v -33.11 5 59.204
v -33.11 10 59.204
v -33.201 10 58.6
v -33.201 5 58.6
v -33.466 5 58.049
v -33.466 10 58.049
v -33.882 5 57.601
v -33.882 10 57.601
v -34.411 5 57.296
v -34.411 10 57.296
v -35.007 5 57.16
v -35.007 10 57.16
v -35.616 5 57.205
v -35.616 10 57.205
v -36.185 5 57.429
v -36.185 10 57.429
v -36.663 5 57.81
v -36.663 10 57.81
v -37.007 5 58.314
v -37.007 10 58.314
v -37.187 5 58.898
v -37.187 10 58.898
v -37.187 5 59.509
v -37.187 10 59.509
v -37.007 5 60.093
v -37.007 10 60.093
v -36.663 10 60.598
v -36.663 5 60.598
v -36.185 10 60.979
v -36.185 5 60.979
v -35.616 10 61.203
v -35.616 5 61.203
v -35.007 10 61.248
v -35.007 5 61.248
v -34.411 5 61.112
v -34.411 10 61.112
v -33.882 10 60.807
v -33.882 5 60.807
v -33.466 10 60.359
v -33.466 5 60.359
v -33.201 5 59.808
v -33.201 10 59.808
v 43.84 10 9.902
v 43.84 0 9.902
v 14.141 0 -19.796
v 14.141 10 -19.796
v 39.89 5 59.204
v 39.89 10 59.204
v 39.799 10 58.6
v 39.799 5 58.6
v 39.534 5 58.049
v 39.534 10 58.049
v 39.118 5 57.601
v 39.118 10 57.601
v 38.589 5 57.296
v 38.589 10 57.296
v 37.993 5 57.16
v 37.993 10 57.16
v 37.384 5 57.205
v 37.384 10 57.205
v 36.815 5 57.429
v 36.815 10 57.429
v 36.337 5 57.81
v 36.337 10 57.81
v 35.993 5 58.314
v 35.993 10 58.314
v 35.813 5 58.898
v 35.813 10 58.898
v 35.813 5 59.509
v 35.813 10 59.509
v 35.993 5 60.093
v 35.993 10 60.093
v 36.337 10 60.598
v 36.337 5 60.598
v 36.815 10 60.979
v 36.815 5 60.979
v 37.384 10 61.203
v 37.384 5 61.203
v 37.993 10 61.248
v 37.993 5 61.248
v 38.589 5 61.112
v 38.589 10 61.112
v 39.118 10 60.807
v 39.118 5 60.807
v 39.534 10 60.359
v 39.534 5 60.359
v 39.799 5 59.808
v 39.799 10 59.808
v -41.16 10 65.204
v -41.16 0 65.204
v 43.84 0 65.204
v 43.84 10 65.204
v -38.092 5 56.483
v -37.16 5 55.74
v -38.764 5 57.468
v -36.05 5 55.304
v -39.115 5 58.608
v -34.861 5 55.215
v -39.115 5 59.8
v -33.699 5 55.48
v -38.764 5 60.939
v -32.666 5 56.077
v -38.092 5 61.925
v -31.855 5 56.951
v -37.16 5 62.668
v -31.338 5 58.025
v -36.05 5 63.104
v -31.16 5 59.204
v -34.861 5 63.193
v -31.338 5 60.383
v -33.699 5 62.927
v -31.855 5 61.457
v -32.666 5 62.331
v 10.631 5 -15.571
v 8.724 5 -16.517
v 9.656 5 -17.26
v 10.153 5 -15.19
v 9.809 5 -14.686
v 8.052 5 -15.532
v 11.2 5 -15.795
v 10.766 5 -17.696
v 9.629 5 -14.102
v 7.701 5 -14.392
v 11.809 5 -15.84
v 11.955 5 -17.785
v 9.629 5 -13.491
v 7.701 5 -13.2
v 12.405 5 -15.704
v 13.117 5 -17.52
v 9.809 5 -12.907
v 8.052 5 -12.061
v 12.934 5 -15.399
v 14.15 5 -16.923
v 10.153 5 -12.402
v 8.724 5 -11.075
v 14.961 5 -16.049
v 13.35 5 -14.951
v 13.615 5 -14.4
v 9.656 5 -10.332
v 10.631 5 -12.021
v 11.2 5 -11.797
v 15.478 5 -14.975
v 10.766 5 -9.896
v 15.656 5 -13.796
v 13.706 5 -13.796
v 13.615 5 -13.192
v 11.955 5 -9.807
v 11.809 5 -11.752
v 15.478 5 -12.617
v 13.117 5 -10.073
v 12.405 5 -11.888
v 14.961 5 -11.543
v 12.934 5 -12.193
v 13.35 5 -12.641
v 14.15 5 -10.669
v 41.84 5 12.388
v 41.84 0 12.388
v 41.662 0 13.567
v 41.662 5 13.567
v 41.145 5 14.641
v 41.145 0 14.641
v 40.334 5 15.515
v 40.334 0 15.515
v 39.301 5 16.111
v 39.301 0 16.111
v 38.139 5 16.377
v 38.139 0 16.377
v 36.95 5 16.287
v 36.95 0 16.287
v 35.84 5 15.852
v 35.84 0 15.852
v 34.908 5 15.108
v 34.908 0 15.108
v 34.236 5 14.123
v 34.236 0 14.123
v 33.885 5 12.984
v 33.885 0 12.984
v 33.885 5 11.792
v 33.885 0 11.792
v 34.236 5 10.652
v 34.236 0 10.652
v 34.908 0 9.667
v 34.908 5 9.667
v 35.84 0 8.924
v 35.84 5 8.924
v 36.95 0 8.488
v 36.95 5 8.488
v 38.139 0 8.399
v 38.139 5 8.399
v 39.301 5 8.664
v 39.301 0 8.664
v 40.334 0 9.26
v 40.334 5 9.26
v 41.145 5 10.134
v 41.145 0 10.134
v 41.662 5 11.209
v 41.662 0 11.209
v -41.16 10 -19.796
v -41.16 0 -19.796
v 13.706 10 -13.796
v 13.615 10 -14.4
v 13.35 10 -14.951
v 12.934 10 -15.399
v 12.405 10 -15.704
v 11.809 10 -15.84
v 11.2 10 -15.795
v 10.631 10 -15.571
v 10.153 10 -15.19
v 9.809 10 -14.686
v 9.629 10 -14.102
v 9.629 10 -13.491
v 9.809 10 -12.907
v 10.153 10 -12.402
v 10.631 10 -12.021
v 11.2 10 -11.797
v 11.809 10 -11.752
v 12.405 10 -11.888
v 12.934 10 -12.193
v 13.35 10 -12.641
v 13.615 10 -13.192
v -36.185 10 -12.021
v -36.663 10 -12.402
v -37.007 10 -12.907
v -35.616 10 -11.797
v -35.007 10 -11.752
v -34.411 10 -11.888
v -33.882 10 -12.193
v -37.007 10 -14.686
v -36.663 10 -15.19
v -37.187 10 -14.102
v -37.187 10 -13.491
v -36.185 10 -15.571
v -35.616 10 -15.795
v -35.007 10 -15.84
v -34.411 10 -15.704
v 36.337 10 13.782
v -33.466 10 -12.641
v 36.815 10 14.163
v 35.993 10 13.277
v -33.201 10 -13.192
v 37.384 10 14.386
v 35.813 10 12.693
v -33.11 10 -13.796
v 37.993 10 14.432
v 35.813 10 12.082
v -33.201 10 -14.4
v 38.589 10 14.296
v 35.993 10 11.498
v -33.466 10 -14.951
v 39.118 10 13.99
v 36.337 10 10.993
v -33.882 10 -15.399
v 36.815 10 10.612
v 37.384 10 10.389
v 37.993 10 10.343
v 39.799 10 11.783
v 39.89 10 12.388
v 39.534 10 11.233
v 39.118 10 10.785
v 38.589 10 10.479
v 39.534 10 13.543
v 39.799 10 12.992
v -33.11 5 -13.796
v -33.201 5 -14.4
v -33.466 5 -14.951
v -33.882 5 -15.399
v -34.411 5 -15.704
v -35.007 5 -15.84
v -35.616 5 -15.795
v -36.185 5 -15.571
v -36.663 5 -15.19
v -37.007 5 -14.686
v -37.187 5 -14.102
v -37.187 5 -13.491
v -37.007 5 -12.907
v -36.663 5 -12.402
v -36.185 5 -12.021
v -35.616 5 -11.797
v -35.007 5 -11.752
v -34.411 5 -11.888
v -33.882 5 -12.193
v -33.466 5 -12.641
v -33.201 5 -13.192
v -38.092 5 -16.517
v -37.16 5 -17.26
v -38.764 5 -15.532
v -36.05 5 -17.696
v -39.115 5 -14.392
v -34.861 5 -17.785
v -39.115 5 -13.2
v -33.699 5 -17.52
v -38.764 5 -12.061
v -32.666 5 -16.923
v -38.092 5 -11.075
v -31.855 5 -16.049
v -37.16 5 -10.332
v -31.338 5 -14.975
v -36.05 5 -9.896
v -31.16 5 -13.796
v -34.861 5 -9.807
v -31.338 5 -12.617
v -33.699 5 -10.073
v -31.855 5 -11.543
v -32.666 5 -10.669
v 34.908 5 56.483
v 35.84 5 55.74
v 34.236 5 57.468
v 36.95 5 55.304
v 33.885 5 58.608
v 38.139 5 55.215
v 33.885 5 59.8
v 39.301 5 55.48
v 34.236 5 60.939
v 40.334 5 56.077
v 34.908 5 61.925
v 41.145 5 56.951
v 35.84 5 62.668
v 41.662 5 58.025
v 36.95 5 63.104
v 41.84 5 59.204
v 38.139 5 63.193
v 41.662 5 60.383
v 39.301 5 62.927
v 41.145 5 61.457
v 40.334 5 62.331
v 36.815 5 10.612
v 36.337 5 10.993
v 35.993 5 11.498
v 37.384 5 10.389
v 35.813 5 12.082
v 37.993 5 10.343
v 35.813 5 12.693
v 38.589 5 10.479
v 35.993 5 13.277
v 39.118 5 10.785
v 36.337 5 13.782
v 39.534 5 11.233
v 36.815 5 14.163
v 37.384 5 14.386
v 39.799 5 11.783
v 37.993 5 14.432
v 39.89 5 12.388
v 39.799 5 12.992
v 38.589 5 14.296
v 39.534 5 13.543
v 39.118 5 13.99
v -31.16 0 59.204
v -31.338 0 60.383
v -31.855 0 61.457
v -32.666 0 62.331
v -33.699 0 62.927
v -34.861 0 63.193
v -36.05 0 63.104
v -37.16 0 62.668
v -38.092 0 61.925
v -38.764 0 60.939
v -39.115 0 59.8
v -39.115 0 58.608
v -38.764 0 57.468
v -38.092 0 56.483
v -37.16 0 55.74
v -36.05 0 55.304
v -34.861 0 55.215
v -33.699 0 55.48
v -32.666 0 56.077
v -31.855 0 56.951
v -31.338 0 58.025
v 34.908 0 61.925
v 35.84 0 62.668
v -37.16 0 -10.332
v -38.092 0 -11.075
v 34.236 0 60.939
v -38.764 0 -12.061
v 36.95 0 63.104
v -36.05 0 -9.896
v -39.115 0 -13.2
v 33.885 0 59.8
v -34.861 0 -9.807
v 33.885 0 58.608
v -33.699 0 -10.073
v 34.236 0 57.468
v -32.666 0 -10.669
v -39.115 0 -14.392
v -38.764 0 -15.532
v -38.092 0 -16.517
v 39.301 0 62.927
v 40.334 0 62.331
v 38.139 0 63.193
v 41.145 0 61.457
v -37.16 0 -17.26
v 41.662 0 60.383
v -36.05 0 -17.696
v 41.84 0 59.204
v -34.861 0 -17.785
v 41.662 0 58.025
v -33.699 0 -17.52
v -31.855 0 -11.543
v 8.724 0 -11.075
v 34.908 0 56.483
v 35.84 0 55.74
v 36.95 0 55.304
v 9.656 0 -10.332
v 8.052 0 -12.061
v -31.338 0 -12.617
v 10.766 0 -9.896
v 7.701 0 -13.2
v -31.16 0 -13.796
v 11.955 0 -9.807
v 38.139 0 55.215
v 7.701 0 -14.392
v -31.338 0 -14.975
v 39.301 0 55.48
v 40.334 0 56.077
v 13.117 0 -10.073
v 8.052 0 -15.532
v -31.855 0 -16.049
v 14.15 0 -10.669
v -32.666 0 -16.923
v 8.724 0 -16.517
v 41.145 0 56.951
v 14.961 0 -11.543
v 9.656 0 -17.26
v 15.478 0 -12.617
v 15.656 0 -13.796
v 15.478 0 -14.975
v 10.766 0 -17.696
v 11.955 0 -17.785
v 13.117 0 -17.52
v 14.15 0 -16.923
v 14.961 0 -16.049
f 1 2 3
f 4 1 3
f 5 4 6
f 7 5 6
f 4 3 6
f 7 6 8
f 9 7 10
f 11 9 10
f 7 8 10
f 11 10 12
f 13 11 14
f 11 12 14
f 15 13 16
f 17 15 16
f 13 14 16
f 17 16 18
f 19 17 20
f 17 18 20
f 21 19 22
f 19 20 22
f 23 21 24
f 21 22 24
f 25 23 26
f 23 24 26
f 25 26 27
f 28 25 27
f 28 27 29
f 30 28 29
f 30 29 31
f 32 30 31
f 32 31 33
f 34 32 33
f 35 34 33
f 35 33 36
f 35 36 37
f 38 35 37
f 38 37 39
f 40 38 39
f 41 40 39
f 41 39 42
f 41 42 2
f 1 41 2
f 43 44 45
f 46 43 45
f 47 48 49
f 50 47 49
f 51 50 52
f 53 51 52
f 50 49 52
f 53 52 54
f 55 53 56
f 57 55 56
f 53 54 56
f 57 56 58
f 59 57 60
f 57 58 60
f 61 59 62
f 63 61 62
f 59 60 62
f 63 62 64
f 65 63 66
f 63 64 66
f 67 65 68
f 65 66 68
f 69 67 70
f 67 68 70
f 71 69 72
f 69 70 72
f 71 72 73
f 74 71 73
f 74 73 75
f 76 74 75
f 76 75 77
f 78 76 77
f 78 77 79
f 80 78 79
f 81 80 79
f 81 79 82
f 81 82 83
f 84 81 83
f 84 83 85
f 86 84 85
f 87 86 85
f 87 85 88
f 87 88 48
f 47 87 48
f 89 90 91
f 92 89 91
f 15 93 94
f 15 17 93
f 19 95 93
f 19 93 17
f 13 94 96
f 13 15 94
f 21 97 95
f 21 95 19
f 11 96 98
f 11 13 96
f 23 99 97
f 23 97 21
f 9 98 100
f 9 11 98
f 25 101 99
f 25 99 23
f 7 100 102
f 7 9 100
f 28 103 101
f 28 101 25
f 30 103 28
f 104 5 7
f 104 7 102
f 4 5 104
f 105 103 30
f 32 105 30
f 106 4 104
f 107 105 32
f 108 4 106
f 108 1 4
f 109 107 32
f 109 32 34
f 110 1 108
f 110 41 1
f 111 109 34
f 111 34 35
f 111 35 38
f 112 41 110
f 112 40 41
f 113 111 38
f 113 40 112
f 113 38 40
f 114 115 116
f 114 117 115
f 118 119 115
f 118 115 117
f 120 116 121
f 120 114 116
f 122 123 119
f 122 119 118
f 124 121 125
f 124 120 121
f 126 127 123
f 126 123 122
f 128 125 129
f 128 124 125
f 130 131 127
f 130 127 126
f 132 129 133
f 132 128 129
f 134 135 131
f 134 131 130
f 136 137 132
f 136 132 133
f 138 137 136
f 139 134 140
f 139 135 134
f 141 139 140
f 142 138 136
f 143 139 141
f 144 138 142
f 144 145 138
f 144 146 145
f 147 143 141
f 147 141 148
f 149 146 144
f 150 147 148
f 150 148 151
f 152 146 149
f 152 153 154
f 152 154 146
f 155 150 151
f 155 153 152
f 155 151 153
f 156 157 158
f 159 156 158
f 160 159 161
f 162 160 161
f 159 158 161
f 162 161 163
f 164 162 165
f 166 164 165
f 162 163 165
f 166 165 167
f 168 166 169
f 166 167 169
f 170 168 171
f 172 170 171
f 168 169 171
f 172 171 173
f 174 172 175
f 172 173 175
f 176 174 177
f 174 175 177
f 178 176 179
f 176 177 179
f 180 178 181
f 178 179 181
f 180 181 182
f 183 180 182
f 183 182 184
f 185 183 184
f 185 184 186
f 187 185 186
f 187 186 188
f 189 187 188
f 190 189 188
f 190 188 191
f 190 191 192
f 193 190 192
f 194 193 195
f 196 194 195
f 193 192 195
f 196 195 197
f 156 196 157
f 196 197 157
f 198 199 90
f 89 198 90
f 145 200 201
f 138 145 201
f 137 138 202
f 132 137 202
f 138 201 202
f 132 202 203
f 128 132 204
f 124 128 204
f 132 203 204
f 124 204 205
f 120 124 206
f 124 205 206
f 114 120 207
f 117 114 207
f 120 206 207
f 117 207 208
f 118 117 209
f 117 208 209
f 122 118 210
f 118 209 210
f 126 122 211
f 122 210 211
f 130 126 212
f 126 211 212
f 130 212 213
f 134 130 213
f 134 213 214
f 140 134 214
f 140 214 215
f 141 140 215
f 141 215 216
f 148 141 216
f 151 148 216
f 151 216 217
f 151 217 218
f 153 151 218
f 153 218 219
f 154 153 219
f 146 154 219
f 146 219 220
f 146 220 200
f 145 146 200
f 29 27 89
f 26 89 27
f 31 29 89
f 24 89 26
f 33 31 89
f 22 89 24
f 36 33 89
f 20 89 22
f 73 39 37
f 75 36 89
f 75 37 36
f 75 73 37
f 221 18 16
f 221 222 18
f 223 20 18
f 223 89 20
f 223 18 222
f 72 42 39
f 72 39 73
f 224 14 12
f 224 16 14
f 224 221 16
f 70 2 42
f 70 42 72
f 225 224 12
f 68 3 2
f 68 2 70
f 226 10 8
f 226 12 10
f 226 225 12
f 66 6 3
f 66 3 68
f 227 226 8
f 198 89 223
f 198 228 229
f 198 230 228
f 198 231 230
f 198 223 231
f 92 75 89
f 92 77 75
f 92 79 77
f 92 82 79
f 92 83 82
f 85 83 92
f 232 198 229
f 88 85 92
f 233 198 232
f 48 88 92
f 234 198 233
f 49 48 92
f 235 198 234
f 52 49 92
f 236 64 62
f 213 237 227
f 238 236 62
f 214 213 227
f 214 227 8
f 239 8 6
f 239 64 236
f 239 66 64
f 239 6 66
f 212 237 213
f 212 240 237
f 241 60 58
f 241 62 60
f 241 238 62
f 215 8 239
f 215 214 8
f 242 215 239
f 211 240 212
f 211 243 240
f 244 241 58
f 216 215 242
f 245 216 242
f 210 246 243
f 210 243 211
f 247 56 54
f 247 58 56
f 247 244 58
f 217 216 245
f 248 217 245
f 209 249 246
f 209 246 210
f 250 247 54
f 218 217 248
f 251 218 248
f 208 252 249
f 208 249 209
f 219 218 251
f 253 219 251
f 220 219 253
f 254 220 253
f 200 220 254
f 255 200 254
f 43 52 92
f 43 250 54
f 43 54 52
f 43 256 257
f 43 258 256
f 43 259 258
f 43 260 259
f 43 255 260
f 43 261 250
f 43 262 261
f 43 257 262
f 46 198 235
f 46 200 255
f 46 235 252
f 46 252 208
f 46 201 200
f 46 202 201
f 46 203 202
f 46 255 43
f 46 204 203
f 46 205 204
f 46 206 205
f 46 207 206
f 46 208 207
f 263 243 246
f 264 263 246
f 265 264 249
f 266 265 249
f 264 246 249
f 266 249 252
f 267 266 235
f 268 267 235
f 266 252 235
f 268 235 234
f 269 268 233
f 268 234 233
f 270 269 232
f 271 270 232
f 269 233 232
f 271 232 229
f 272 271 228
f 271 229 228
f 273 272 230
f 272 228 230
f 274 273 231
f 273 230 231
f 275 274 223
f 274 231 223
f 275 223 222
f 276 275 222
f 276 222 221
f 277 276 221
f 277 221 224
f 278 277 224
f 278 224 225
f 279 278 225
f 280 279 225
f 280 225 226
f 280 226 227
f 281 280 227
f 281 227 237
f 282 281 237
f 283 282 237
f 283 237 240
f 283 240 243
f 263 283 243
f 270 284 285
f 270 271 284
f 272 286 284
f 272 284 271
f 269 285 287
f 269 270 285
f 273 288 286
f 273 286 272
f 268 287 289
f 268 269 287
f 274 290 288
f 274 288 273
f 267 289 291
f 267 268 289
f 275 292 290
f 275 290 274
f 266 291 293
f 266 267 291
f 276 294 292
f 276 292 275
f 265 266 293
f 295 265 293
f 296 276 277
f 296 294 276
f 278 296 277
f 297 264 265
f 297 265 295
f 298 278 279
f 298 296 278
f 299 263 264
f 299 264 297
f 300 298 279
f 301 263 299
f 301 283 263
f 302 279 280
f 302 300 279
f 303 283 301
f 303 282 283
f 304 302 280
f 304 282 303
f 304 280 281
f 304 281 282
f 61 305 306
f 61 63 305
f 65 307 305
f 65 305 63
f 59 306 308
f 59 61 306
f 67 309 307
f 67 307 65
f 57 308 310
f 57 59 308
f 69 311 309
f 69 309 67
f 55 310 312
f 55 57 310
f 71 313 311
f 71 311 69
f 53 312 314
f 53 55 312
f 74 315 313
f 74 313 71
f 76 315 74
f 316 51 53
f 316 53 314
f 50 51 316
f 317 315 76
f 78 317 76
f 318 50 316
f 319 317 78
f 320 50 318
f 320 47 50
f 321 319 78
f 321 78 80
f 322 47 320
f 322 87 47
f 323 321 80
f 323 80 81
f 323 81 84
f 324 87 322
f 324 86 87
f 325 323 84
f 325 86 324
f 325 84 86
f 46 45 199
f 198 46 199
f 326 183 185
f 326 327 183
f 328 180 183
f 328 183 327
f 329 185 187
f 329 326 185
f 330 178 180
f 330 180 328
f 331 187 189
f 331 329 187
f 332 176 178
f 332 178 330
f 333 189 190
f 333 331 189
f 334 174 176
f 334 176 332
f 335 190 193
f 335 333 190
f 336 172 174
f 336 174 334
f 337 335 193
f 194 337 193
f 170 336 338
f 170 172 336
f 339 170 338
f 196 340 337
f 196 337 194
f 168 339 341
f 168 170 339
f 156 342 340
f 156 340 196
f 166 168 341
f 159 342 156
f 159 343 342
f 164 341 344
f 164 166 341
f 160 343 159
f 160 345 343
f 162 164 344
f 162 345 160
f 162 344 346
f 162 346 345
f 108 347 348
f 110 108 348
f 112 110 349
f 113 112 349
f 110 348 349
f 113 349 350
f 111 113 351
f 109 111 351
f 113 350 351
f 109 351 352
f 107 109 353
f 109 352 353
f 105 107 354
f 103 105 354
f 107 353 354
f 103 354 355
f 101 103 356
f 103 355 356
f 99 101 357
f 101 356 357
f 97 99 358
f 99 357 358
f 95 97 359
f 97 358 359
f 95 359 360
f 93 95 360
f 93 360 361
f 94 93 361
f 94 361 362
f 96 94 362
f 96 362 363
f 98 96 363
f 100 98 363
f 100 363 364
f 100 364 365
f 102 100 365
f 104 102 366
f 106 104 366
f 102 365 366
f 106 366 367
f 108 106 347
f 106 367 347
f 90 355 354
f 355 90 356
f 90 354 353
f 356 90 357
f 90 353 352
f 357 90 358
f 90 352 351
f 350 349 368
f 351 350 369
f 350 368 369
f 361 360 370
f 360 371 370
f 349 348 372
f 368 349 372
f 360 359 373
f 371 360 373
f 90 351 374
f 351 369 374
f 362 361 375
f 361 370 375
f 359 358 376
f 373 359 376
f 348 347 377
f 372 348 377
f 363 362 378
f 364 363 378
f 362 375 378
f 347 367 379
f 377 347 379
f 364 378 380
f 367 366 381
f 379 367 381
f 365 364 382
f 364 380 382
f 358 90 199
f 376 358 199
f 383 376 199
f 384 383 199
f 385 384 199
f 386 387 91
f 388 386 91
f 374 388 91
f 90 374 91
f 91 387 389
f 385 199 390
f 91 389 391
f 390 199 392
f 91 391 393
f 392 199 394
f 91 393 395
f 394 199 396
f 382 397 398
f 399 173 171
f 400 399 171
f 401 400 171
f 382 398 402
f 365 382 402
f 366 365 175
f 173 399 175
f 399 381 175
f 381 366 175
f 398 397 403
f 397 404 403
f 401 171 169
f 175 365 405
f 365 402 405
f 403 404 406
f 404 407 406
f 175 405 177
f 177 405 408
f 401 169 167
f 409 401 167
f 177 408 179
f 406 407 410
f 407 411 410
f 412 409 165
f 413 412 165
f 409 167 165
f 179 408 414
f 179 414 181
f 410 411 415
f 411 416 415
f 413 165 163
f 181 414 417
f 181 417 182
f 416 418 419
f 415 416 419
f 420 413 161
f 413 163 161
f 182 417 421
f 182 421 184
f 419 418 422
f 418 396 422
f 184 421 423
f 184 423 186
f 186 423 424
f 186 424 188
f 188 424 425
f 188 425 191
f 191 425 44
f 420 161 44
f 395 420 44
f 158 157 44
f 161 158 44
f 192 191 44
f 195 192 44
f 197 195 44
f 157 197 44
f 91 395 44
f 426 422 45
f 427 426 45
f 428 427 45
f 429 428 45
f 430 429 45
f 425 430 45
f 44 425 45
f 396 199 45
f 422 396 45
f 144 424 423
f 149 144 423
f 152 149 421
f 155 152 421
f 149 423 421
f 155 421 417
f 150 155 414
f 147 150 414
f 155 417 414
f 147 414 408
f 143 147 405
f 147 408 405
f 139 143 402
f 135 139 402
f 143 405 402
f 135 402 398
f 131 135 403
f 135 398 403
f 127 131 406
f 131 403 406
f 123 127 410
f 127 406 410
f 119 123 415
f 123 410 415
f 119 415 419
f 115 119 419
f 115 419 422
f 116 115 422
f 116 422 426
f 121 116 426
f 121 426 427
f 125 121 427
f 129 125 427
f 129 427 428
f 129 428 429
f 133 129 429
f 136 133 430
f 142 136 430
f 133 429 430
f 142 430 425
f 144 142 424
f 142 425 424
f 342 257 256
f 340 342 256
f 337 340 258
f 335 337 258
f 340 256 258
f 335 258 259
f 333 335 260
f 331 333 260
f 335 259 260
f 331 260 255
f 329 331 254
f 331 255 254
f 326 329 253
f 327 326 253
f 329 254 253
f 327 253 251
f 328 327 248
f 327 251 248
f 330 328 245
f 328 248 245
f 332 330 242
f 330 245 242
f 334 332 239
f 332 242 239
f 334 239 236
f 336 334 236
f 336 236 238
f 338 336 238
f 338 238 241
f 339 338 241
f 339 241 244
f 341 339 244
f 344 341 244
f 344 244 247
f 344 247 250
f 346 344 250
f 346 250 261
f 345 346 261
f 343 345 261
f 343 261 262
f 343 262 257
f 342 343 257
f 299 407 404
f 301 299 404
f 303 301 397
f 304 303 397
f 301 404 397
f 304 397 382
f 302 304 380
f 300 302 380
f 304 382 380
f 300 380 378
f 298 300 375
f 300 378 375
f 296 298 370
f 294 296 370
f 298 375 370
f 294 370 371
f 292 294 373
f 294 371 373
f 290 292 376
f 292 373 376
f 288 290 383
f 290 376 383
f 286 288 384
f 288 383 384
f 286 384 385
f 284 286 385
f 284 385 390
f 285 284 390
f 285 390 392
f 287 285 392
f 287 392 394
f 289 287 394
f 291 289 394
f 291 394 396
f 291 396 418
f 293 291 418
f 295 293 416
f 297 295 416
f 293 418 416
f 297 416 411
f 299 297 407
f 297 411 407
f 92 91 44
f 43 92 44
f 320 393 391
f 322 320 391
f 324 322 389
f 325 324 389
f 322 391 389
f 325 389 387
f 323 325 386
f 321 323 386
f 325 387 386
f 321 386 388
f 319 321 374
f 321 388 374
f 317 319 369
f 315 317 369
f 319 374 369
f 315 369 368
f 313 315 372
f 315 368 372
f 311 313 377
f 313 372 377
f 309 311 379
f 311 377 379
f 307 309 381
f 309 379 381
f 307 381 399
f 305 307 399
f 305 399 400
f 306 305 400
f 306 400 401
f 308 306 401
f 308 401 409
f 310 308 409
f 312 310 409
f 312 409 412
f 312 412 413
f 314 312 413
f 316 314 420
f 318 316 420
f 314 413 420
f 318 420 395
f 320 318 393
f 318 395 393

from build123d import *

# Parameters (mm, degrees)
BOSS_EXTRUDE1_DEPTH = 10
CUT_EXTRUDE3_REACH  = 12
SKETCH2_R           = 2.05
SKETCH5_R           = 4
CUT_EXTRUDE4_DEPTH  = 5


with BuildPart() as part:
    # Sketch1 → Boss-Extrude1 (new body)
    with BuildSketch(Plane(origin=(0, 0, 0), x_dir=(1, 0, 0), z_dir=(0, 1, 0))):
        Polygon((-41.160131748, 19.796063365), (-41.160131748, -65.203936635), (43.839868252, -65.203936635), (43.839868252, -9.902421445), (14.141383442, 19.796063365), align=None)
    extrude(amount=BOSS_EXTRUDE1_DEPTH)

    # Sketch2 → Cut-Extrude3 (cut, up to next)
    with BuildSketch(Plane(origin=(0, 10, 0), x_dir=(1, 0, 0), z_dir=(0, 1, 0)), mode=Mode.PRIVATE) as cut_extrude3_sk1:
        with Locations((37.839868252, -12.387702819)):
            Circle(SKETCH2_R)
    cut_extrude3_tool1 = extrude(cut_extrude3_sk1.sketch, amount=-CUT_EXTRUDE3_REACH, mode=Mode.PRIVATE) & part.part
    add(cut_extrude3_tool1.solids().sort_by_distance((37.839868, 10, 12.387703))[0], mode=Mode.SUBTRACT)
    # Sketch2 → Cut-Extrude3 (cut, up to next)
    with BuildSketch(Plane(origin=(0, 10, 0), x_dir=(1, 0, 0), z_dir=(0, 1, 0)), mode=Mode.PRIVATE) as cut_extrude3_sk2:
        with Locations((37.839868252, -59.203936635)):
            Circle(SKETCH2_R)
    cut_extrude3_tool2 = extrude(cut_extrude3_sk2.sketch, amount=-CUT_EXTRUDE3_REACH, mode=Mode.PRIVATE) & part.part
    add(cut_extrude3_tool2.solids().sort_by_distance((37.839868, 10, 59.203937))[0], mode=Mode.SUBTRACT)
    # Sketch2 → Cut-Extrude3 (cut, up to next)
    with BuildSketch(Plane(origin=(0, 10, 0), x_dir=(1, 0, 0), z_dir=(0, 1, 0)), mode=Mode.PRIVATE) as cut_extrude3_sk3:
        with Locations((-35.160131748, -59.203936635)):
            Circle(SKETCH2_R)
    cut_extrude3_tool3 = extrude(cut_extrude3_sk3.sketch, amount=-CUT_EXTRUDE3_REACH, mode=Mode.PRIVATE) & part.part
    add(cut_extrude3_tool3.solids().sort_by_distance((-35.160132, 10, 59.203937))[0], mode=Mode.SUBTRACT)
    # Sketch2 → Cut-Extrude3 (cut, up to next)
    with BuildSketch(Plane(origin=(0, 10, 0), x_dir=(1, 0, 0), z_dir=(0, 1, 0)), mode=Mode.PRIVATE) as cut_extrude3_sk4:
        with Locations((-35.160131748, 13.796063365)):
            Circle(SKETCH2_R)
    cut_extrude3_tool4 = extrude(cut_extrude3_sk4.sketch, amount=-CUT_EXTRUDE3_REACH, mode=Mode.PRIVATE) & part.part
    add(cut_extrude3_tool4.solids().sort_by_distance((-35.160132, 10, -13.796063))[0], mode=Mode.SUBTRACT)
    # Sketch2 → Cut-Extrude3 (cut, up to next)
    with BuildSketch(Plane(origin=(0, 10, 0), x_dir=(1, 0, 0), z_dir=(0, 1, 0)), mode=Mode.PRIVATE) as cut_extrude3_sk5:
        with Locations((11.656102068, 13.796063365)):
            Circle(SKETCH2_R)
    cut_extrude3_tool5 = extrude(cut_extrude3_sk5.sketch, amount=-CUT_EXTRUDE3_REACH, mode=Mode.PRIVATE) & part.part
    add(cut_extrude3_tool5.solids().sort_by_distance((11.656102, 10, -13.796063))[0], mode=Mode.SUBTRACT)

    # Sketch5 → Cut-Extrude4 (cut)
    with BuildSketch(Plane.XZ):
        with Locations((37.839868252, 59.203936635)):
            Circle(SKETCH5_R)
        with Locations((37.839868252, 12.387702819)):
            Circle(SKETCH5_R)
        with Locations((11.656102068, -13.796063365)):
            Circle(SKETCH5_R)
        with Locations((-35.160131748, -13.796063365)):
            Circle(SKETCH5_R)
        with Locations((-35.160131748, 59.203936635)):
            Circle(SKETCH5_R)
    extrude(amount=-CUT_EXTRUDE4_DEPTH, mode=Mode.SUBTRACT)


solid = part.part
